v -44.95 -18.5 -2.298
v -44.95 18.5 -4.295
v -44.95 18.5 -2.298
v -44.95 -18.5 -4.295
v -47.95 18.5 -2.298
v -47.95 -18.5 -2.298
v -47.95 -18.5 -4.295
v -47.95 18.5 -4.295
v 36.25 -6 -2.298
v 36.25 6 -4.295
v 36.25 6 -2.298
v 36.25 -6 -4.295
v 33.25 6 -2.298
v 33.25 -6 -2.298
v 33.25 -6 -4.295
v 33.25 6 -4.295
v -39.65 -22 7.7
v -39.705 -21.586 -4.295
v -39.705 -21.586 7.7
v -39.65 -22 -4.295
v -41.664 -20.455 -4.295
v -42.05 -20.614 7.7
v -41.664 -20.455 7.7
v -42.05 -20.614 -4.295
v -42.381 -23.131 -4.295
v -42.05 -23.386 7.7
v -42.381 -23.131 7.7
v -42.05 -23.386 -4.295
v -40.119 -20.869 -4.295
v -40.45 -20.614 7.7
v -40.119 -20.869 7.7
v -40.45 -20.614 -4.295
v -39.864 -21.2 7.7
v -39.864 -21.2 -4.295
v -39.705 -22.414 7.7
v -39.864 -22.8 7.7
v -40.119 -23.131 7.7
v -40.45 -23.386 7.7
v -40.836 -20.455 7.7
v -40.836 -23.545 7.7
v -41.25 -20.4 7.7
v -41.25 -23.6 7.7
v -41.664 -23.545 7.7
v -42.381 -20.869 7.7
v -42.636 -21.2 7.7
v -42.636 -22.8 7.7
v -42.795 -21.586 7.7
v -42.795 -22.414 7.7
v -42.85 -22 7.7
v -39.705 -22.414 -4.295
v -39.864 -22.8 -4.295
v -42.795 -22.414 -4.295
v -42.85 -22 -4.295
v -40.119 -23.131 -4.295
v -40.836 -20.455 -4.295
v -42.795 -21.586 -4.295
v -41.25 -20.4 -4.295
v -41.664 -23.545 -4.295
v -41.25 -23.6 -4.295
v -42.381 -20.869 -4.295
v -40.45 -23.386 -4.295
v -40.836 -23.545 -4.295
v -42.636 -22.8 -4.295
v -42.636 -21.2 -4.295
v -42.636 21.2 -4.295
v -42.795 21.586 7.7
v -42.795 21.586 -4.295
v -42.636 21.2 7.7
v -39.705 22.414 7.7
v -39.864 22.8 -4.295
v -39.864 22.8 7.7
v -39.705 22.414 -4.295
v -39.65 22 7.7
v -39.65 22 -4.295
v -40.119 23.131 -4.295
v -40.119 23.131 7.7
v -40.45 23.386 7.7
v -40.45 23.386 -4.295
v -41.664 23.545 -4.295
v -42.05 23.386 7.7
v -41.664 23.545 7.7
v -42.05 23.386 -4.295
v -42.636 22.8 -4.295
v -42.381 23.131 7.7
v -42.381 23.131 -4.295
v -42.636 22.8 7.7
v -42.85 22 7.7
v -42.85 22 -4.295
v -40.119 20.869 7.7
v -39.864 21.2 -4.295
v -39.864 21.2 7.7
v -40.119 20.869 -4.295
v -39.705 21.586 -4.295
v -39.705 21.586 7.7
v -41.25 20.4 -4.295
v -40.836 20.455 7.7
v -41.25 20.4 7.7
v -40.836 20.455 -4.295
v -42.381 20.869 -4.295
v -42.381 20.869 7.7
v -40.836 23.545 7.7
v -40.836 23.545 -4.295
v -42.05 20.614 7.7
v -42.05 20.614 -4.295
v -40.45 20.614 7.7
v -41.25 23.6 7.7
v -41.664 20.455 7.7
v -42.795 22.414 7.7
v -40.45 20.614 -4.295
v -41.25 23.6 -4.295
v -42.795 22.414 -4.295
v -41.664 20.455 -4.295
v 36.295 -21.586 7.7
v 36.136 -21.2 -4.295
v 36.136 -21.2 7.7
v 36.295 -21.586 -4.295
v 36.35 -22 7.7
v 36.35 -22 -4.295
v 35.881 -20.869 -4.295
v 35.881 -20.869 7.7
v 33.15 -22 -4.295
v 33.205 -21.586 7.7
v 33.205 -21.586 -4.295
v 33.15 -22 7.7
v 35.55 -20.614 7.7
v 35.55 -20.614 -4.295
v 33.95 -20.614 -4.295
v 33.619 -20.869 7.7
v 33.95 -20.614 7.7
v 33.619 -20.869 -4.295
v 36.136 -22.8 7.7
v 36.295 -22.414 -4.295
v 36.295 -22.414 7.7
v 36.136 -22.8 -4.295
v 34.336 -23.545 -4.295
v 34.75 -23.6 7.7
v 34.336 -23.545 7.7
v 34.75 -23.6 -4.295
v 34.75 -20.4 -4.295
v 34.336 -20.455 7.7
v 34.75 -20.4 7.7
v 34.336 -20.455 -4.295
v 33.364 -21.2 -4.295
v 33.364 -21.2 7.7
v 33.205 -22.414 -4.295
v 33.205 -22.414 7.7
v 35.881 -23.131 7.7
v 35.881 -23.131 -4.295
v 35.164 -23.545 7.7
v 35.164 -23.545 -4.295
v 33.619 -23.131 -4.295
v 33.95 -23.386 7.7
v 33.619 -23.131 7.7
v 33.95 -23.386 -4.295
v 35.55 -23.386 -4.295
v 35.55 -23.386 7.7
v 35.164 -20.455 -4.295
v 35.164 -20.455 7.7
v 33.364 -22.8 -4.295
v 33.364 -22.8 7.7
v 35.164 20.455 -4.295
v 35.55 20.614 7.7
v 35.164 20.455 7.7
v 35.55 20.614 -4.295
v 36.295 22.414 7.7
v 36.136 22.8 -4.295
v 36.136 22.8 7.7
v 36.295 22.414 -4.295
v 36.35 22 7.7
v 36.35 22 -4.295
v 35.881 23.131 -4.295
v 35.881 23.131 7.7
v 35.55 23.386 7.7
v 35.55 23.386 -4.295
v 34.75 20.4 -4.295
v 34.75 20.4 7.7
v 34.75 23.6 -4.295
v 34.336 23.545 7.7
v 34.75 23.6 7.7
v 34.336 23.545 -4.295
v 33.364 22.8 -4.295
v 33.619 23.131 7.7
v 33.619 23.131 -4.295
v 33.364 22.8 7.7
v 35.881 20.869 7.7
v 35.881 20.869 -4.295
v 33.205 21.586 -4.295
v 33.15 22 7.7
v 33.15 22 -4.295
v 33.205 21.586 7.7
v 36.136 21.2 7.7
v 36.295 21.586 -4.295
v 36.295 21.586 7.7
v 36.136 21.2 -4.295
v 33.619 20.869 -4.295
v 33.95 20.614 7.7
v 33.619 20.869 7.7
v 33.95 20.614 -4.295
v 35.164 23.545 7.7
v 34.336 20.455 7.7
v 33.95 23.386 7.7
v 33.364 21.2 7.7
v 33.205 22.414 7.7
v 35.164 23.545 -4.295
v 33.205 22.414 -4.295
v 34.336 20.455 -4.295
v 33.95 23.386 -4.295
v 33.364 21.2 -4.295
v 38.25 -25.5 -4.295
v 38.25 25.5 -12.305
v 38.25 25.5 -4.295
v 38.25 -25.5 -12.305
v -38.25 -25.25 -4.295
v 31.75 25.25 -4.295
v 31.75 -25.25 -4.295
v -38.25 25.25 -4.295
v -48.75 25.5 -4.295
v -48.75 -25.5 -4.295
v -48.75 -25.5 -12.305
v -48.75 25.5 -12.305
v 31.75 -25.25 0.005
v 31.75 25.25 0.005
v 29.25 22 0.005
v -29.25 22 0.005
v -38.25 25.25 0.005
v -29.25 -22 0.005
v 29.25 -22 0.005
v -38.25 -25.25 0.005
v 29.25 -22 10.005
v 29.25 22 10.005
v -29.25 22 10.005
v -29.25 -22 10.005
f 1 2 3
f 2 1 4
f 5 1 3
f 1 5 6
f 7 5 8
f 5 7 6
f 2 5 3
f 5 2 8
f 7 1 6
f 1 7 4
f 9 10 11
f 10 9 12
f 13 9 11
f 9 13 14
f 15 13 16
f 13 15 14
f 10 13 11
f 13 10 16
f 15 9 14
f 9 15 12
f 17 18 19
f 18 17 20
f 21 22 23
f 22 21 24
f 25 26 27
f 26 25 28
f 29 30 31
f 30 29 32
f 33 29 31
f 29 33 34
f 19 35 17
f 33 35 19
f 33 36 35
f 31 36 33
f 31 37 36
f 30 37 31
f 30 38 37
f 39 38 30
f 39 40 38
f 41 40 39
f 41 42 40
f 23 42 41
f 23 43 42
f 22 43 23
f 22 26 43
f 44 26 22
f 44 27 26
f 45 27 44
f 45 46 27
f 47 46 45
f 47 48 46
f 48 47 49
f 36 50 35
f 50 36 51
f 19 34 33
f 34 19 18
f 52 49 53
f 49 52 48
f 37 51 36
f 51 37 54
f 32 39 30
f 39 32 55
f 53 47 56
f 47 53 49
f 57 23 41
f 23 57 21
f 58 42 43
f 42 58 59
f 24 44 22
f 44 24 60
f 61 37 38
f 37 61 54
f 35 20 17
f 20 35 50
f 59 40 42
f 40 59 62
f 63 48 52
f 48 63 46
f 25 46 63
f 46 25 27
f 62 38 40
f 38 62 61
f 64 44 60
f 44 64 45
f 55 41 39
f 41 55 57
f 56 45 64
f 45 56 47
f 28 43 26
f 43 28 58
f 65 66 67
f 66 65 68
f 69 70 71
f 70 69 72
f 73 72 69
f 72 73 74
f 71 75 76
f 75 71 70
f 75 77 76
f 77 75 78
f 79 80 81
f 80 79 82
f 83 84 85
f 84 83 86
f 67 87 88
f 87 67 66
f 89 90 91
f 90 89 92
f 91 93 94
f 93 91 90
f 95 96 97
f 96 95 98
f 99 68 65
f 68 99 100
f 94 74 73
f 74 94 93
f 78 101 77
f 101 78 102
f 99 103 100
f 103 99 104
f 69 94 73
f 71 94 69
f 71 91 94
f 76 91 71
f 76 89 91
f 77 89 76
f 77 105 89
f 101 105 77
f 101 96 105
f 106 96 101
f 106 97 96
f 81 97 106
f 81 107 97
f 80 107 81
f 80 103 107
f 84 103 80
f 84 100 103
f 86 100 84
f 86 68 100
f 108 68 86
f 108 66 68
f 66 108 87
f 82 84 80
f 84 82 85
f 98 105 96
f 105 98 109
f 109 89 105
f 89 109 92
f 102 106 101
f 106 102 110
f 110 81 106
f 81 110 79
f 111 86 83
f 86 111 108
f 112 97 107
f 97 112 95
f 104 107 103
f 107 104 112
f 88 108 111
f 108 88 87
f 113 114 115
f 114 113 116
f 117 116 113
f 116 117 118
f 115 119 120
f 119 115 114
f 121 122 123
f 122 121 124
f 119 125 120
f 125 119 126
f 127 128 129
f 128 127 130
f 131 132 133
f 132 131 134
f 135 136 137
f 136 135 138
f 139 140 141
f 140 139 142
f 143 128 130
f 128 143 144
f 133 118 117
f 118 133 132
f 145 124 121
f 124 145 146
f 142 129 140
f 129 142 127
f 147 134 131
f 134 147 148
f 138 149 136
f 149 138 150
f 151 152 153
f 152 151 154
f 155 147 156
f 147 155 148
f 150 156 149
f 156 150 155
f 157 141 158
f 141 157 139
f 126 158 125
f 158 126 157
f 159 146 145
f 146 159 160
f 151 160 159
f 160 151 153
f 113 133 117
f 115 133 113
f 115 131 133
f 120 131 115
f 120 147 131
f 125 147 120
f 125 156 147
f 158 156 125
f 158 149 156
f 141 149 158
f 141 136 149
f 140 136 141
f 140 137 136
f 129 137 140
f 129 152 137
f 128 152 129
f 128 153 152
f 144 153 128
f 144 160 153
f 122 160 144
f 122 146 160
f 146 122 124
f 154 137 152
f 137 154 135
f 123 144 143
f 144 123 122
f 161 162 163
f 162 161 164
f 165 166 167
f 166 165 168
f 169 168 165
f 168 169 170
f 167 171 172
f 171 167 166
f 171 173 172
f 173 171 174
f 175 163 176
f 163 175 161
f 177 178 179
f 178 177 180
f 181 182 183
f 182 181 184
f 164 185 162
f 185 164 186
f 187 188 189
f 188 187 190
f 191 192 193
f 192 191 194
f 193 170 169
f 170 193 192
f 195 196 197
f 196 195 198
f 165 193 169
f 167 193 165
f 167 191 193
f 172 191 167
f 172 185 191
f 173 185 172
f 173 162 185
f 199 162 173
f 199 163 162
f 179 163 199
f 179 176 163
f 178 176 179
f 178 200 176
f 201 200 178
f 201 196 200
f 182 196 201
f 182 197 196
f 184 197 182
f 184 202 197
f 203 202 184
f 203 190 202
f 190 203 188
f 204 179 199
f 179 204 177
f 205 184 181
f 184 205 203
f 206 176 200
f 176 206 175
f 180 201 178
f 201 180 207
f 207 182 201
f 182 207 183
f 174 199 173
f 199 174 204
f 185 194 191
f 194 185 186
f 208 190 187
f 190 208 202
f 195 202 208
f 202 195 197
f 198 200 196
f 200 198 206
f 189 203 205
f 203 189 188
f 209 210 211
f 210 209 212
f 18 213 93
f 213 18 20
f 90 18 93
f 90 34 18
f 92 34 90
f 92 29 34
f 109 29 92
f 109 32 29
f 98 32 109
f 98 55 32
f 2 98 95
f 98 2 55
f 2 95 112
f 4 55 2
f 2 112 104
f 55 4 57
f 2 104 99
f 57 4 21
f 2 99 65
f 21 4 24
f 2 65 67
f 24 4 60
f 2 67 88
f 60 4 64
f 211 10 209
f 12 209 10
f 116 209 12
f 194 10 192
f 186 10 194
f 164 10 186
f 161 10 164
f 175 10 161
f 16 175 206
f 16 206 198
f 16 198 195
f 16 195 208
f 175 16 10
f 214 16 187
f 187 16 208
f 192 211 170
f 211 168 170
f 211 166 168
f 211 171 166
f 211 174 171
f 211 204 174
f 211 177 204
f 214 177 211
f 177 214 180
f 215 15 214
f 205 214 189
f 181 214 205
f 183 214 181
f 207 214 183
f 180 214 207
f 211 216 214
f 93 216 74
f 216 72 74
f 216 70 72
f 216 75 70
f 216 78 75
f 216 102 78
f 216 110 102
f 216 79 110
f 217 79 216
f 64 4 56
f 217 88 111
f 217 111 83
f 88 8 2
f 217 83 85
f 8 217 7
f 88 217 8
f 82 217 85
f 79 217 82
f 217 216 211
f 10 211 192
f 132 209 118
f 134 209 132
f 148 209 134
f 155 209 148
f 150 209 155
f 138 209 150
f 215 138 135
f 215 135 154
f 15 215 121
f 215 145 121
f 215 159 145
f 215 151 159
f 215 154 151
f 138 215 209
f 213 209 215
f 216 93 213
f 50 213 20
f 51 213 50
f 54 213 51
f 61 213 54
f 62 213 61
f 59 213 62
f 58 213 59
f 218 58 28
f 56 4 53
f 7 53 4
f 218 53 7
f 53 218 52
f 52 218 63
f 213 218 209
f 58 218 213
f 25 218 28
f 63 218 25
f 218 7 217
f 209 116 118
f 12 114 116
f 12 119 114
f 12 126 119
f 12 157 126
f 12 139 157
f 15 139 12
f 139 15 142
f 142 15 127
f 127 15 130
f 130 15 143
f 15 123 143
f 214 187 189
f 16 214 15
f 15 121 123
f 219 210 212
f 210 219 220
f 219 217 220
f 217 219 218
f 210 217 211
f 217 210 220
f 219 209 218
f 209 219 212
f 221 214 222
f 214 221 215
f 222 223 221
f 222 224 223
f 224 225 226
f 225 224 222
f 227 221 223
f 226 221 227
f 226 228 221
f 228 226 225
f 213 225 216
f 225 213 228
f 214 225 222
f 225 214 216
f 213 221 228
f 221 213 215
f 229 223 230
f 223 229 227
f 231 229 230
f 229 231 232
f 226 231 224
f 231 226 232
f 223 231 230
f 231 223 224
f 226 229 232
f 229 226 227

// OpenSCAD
module DisplayCutout() {
  display_offset = 5.25;
  translate([-display_offset, 0, 0]) {
    // Display viewing region
    translate([display_offset, 0, 5]) {
      cube([58.5, 44, 10 + 0.01], center = true);
    }

    display_thickness = 4.3;
    translate([0, 0, -display_thickness]) {
      // Display
      translate([2, 0, display_thickness / 2]) {
        cube([70, 50.5, display_thickness + 0.01], center = true);
      }

      // Pin clearances
      for(c = [[-41.2, 37], [40, 12]]) {
        translate([c[0], 0, 1]) {
          cube([3, c[1], 2.005], center = true);
        }
      }

      pcb_clearance = 8;
      translate([0, 0, -pcb_clearance]) {
        // PCB
        translate([0, 0, pcb_clearance / 2]) {
          cube([87, 51, pcb_clearance + 0.01], center = true);
        }

        // Mounting holes
        mounting_hole_centres = [76, 44] / 2;
        for(x = [-mounting_hole_centres[0], mounting_hole_centres[0]]) {
          for(y = [-mounting_hole_centres[1], mounting_hole_centres[1]]) {
            translate([x + 2, y]) {
              cylinder(h = 20, d = 3.2, $fn = 24);
            }
          }
        }
      }
    }
  }
}

DisplayCutout();
